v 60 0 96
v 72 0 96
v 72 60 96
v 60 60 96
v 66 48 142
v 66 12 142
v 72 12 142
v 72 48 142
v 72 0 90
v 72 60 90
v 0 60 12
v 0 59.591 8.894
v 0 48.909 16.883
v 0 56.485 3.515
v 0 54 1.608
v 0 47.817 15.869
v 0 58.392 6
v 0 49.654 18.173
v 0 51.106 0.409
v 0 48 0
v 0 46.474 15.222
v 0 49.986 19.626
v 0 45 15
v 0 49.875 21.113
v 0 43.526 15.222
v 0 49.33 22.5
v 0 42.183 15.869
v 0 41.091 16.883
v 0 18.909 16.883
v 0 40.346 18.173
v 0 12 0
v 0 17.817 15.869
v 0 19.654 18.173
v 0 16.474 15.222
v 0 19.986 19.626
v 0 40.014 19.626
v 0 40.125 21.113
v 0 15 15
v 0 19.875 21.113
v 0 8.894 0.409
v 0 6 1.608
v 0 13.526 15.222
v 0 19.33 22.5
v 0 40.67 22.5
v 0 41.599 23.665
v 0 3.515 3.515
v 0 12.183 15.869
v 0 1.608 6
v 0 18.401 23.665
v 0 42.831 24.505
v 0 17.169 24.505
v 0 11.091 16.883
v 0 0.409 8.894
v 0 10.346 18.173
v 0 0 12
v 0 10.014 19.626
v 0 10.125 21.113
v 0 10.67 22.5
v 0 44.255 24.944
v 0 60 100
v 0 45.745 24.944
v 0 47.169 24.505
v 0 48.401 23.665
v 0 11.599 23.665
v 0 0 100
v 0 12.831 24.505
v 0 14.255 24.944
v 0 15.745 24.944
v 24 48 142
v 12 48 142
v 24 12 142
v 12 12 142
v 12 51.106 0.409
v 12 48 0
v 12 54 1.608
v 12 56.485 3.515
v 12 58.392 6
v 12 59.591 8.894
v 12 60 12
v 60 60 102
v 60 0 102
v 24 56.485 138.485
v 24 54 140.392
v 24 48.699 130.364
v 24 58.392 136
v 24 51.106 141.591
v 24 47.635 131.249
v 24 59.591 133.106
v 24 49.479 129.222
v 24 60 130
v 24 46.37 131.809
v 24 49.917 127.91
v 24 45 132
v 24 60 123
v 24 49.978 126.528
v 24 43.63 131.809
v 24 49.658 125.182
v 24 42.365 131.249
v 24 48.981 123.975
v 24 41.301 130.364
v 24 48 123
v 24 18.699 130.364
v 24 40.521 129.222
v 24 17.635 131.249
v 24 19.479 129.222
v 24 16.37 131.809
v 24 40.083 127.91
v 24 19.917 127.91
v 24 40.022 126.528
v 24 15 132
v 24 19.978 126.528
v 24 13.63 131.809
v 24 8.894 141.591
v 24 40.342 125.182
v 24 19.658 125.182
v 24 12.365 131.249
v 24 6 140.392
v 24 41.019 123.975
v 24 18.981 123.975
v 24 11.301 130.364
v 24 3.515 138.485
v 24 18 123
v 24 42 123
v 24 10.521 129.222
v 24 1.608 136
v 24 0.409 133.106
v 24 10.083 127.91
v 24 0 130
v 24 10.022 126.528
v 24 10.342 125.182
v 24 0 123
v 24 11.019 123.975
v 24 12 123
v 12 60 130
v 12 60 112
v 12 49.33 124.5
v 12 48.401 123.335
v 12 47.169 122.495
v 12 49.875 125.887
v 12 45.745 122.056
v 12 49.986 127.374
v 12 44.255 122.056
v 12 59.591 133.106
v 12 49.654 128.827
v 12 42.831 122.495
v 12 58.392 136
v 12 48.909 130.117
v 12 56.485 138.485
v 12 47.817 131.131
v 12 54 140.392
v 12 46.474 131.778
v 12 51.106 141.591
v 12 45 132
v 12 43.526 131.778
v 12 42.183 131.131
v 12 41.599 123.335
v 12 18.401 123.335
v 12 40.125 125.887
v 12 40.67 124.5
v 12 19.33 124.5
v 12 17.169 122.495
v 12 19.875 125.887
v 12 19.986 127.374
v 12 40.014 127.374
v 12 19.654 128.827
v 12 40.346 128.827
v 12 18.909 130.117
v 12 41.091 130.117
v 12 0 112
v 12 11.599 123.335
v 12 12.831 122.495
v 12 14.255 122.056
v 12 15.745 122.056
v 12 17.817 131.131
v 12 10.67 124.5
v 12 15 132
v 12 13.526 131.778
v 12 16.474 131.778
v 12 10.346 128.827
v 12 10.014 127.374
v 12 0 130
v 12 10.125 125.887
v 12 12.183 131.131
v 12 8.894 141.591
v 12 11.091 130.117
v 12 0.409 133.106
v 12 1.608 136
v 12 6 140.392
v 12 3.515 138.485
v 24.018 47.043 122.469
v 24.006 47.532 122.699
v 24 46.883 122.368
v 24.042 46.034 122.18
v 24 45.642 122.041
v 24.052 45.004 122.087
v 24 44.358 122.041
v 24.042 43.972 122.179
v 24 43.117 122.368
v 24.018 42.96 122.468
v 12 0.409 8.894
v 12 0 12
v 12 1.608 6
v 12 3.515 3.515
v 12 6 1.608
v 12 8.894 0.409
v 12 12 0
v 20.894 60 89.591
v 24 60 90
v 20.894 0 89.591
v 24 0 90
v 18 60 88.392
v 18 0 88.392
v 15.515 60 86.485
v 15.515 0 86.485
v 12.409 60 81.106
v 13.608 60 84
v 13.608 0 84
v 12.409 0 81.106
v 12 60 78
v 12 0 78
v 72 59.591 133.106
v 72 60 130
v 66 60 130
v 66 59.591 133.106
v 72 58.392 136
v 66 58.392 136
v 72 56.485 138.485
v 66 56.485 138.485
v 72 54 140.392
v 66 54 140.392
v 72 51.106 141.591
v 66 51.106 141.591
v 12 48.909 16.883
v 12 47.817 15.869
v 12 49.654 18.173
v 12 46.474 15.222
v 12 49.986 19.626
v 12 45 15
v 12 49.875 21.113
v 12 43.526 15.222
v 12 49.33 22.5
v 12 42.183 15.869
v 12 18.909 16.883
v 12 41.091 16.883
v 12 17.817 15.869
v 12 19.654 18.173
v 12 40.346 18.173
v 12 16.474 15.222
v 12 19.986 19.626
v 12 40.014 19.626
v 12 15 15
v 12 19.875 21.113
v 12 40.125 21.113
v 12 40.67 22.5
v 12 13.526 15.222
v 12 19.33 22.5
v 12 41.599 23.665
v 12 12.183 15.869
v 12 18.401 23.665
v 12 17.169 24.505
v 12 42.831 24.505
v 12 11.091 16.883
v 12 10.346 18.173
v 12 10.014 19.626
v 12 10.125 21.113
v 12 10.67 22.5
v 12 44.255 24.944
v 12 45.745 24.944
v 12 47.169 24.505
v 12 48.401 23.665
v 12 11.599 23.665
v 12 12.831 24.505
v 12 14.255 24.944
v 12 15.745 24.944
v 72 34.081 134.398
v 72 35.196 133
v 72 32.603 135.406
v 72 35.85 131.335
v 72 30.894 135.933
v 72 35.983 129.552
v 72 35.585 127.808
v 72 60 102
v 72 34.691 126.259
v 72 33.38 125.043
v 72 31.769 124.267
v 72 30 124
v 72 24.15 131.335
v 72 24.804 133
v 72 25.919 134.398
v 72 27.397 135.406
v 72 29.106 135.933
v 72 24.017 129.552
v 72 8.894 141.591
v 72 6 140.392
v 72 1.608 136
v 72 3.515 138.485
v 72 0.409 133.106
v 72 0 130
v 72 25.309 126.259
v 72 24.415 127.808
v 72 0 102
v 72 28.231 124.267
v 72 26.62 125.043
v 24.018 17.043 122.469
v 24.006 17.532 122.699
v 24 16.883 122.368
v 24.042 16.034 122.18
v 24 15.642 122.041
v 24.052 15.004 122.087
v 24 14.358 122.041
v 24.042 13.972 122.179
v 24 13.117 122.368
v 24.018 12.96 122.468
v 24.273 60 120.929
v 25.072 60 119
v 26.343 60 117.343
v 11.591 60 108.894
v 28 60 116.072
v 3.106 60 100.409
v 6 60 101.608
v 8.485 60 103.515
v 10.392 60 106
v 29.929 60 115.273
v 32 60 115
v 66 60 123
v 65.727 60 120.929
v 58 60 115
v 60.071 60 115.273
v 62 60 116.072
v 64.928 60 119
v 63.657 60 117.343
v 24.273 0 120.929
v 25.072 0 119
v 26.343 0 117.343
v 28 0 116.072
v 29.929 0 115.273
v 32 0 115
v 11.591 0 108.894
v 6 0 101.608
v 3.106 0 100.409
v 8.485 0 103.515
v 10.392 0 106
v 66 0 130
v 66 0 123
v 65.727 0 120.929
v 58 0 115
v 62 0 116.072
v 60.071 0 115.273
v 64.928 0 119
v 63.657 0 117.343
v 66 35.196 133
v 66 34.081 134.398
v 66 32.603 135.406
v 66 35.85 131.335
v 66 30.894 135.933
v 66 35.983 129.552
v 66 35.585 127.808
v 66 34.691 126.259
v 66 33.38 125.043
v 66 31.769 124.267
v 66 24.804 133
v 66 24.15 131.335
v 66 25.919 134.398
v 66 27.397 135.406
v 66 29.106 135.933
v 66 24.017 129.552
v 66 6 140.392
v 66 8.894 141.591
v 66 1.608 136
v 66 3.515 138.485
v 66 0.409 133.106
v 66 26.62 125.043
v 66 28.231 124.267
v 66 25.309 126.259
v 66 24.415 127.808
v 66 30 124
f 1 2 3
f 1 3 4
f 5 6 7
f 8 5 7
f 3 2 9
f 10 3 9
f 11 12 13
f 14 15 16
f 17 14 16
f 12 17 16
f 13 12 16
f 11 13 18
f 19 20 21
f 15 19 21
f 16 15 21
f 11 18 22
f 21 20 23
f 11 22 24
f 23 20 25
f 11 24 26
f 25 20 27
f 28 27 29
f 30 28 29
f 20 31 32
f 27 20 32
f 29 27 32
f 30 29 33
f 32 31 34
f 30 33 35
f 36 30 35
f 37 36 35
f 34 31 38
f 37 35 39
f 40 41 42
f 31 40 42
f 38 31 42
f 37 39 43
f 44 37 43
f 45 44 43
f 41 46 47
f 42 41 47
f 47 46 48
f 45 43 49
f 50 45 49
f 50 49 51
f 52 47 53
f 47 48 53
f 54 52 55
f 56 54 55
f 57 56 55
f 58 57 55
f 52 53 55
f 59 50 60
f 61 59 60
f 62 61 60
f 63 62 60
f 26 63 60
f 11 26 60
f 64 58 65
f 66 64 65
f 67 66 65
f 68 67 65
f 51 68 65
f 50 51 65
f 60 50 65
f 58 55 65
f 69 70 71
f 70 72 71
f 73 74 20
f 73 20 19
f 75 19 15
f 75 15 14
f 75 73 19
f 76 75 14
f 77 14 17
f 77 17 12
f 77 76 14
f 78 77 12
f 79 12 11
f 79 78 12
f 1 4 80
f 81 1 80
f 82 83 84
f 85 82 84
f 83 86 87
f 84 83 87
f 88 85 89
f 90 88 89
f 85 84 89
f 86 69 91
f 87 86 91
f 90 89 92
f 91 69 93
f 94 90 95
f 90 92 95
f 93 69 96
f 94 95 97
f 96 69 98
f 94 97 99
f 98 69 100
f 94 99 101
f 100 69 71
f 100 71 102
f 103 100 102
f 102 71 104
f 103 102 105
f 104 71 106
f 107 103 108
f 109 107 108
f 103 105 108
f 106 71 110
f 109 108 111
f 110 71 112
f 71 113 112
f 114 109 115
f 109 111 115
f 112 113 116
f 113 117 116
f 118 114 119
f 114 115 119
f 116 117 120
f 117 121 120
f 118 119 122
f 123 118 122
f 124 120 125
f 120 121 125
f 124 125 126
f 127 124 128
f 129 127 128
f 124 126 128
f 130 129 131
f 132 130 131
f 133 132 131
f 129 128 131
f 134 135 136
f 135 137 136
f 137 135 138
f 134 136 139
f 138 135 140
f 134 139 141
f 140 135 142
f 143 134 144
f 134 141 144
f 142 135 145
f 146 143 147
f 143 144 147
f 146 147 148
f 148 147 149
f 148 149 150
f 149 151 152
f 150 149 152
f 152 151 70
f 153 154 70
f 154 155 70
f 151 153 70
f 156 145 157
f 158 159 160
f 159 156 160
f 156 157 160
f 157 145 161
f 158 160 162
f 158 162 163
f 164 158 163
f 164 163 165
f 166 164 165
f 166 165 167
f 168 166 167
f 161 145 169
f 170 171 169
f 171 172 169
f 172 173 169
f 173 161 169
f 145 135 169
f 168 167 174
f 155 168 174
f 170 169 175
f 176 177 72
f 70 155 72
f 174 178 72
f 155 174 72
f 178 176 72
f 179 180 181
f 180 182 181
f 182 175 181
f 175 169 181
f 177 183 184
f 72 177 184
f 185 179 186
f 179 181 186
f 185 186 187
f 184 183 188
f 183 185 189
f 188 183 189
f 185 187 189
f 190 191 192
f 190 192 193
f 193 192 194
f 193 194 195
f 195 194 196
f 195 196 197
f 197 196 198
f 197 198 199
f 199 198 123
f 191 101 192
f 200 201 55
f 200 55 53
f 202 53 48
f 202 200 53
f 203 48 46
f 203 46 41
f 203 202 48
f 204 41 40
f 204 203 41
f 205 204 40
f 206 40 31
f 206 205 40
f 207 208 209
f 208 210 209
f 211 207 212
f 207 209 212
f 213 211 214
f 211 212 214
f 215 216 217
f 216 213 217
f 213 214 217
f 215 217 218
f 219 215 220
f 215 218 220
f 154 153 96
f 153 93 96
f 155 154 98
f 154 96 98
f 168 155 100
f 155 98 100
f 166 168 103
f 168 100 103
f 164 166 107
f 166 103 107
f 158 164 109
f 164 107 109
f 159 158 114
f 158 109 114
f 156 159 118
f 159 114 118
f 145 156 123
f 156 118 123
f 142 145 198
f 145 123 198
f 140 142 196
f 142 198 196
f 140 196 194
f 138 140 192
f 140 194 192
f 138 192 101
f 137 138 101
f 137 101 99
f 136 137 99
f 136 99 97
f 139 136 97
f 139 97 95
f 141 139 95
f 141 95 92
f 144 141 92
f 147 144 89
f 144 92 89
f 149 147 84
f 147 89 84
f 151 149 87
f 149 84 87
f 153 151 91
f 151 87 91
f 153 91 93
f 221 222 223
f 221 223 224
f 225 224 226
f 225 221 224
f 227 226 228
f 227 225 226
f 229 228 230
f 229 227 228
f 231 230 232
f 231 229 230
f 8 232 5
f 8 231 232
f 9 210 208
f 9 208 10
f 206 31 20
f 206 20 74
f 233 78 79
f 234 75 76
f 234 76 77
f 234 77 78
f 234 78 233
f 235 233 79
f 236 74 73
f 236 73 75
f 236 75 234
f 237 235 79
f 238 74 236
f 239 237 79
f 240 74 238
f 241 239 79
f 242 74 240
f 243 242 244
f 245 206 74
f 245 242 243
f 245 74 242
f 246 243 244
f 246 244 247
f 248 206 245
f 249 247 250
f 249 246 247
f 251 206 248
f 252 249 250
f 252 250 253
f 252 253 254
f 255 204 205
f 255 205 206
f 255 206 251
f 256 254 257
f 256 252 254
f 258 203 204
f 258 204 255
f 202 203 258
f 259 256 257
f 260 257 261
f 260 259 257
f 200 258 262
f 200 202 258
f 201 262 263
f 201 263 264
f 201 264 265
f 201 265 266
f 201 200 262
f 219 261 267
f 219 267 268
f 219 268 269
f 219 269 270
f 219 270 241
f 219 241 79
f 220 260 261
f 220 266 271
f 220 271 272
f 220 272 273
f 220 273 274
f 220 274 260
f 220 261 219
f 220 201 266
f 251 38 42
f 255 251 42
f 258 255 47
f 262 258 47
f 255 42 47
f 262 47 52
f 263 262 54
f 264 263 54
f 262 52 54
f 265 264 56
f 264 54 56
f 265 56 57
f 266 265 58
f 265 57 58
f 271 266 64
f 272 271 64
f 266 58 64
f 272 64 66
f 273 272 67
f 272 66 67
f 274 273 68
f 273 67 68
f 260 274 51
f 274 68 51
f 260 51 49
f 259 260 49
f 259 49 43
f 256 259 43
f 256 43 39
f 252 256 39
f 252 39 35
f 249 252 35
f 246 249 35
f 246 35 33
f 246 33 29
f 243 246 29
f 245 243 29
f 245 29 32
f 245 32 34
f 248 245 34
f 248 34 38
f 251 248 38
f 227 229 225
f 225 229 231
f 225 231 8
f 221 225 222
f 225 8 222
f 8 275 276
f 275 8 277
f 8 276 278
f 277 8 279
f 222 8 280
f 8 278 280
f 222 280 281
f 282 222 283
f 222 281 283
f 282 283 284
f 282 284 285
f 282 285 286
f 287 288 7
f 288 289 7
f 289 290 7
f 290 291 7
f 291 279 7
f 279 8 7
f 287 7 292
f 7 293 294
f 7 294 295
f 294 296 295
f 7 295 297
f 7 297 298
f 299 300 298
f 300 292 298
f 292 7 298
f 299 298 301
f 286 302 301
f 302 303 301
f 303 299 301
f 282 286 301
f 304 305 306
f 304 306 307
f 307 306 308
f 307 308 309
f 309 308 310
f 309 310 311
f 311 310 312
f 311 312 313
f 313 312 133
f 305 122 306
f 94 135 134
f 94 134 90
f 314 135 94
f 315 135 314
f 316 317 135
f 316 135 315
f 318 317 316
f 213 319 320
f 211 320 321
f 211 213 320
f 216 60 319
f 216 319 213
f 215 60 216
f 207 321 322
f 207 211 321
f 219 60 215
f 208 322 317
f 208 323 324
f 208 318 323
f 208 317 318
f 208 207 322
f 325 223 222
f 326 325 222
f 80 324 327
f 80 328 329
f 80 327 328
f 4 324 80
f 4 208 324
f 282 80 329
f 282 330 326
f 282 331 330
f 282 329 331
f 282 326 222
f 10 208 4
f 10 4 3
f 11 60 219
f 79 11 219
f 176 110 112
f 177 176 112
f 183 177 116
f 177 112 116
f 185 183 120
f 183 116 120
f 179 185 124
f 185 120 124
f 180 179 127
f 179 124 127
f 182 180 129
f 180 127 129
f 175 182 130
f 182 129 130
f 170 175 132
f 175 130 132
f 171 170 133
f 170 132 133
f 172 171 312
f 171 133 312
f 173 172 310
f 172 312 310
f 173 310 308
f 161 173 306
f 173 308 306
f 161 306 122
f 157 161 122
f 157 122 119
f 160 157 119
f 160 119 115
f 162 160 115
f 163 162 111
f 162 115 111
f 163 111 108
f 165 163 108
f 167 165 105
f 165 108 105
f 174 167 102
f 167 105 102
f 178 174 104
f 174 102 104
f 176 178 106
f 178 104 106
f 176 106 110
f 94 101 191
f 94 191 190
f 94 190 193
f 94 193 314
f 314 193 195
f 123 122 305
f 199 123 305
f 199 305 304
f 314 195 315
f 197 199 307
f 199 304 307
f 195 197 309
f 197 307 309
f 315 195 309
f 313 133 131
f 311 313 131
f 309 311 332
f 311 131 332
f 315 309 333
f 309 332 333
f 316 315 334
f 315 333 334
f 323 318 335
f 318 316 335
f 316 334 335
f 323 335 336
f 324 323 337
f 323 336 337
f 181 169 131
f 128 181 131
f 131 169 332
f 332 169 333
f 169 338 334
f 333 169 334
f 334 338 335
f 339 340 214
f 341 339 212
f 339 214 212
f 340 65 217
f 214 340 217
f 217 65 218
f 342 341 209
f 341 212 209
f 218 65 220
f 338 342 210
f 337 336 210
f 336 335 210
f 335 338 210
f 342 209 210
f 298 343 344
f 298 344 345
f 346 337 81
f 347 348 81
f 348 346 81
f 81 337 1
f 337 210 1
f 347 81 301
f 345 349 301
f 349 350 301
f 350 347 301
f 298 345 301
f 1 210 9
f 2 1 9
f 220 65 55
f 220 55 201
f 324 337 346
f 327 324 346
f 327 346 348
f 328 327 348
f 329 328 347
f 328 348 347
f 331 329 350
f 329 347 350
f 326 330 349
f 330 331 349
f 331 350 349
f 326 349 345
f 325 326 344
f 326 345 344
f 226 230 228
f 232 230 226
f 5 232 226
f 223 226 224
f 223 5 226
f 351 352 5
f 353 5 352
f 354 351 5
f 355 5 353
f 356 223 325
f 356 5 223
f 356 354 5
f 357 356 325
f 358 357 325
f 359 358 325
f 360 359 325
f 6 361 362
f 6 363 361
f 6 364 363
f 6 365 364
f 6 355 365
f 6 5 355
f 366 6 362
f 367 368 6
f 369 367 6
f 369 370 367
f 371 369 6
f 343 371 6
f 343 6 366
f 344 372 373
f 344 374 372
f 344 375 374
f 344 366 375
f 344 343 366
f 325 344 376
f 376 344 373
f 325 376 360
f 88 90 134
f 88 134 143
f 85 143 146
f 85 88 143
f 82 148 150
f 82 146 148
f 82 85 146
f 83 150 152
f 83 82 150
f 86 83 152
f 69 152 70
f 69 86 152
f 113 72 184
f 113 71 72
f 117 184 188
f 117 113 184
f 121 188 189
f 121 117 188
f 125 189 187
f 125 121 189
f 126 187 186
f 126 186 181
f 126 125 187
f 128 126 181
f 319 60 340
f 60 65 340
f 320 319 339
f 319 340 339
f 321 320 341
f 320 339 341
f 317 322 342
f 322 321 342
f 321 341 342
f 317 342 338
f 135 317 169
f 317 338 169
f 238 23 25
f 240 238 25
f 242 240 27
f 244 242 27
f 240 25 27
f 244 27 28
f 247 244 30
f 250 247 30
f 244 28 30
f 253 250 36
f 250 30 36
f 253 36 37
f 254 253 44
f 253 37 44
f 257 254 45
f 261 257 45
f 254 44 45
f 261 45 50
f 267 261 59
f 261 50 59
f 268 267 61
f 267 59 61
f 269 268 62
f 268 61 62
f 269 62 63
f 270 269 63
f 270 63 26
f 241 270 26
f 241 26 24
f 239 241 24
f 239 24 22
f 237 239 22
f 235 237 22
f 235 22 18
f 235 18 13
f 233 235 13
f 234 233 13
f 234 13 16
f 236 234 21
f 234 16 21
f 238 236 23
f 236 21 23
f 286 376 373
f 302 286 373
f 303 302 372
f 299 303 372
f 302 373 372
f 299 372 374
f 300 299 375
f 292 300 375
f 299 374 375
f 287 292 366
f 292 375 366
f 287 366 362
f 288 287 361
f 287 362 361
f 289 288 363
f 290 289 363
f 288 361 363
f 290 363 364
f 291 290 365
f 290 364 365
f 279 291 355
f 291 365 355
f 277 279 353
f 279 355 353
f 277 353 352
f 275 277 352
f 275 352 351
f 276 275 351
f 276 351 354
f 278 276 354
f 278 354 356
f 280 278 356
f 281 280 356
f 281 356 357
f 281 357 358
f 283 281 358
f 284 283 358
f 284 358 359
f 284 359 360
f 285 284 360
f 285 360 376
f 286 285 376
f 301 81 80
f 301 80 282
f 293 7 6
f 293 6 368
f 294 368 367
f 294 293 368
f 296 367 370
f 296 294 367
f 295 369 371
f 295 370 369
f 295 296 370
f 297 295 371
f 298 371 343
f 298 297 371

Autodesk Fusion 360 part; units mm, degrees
sketch "Sketch1" plane through (0, 0, 0) normal (0, 1, 0) x (1, 0, 0)
  line L0 (0, 0) -> (0, -100)
  line L1 (12, -112) -> (12, -142)
  arc A0 (12, -112) -> (0, -100) centre (0, -112) ccw
  line L2 (12, -142) -> (24, -142)
  line L3 (0, 0) -> (12, 0)
  line L4 (12, 0) -> (12, -78)
  line L5 (24, -90) -> (72, -90)
  line L6 (32, -115) -> (58, -115)
  line L7 (24, -142) -> (24, -123)
  arc A1 (32, -115) -> (24, -123) centre (32, -123) ccw
  line L8 (66, -142) -> (66, -123)
  arc A2 (66, -123) -> (58, -115) centre (58, -123) ccw
  line L9 (66, -142) -> (72, -142)
  line L10 (72, -142) -> (72, -90)
  arc A3 (12, -78) -> (24, -90) centre (24, -78) ccw
  point P0 (12, -90)
  dimension "d1" = 100
  dimension "d2" = 24
  dimension "d4" = 142
  dimension "d6" = 12
  dimension "d7" = 90
  dimension "d8" = 25
  dimension "d9" = 8
  dimension "d10" = 42
  dimension "d11" = 8
  dimension "d12" = 6
  dimension "d13" = 12
extrude "Extrude1" add sketch "Sketch1" along normal blind 60
fillet "Fillet1" radius 12 2 edges at (18, 60, 142) (18, 0, 142)
fillet "Fillet2" radius 12 2 edges at (69, 0, 142) (69, 60, 142)
fillet "Fillet3" radius 12 2 edges at (6, 60, 0) (6, 0, 0)
sketch "Sketch2" plane through (0, 0, 0) normal (0, -1, 0) x (1, 0, 0)
  line L0 (0, 12) -> (12, 12)
  line L1 (12, 12) -> (12, 78)
  arc A0 (24, 90) -> (12, 78) centre (24, 78) ccw
  line L2 (24, 90) -> (72, 90)
  line L3 (72, 90) -> (72, 130)
  line L4 (72, 130) -> (66, 130)
  line L5 (66, 130) -> (66, 123)
  arc A1 (58, 115) -> (66, 123) centre (58, 123) ccw
  line L6 (58, 115) -> (32, 115)
  arc A2 (24, 123) -> (32, 115) centre (32, 123) ccw
  line L7 (24, 123) -> (24, 130)
  line L8 (24, 130) -> (12, 130)
  line L9 (12, 130) -> (12, 112)
  arc A3 (0, 100) -> (12, 112) centre (0, 112) ccw
  line L10 (0, 100) -> (0, 12)
  line L11 (60, 102) -> (72, 102)
  line L12 (72, 102) -> (72, 96)
  line L13 (72, 96) -> (60, 96)
  line L14 (60, 96) -> (60, 102)
  dimension "d22" = 6
  dimension "d23" = 12
  dimension "d24" = 12
extrude "Extrude2" cut sketch "Sketch2" against normal through all contours L3 L11 L12 L13 L14
sketch "Sketch3" plane through (72, 0, 0) normal (1, 0, 0) x (0, 1, 0)
  line L0 (0, 102) -> (60, 102)
  line L1 (60, 102) -> (60, 130)
  arc A0 (60, 130) -> (48, 142) centre (48, 130) ccw
  line L2 (48, 142) -> (12, 142)
  arc A1 (12, 142) -> (0, 130) centre (12, 130) ccw
  line L3 (0, 130) -> (0, 102)
  point P0 (30, 130)
hole "Hole1" at (72, 30, 130) direction (-1, 0, 0) diameter 12 depth 6 tip angle 118
sketch "Sketch4" plane through (12, 0, 0) normal (1, 0, 0) x (0, 1, 0)
  arc A0 (0, 12) -> (12, 0) centre (12, 12) ccw
  line L0 (12, 0) -> (48, 0)
  arc A1 (48, 0) -> (60, 12) centre (48, 12) ccw
  line L1 (60, 12) -> (60, 78)
  line L2 (60, 78) -> (0, 78)
  line L3 (0, 78) -> (0, 12)
  point P0 (15, 20)
  point P1 (45, 20)
  dimension "d30" = 15
  dimension "d31" = 15
  dimension "d32" = 20
hole "Hole2" at (12, 45, 20) at (12, 15, 20) direction (-1, 0, 0) diameter 10 depth 12 tip angle 118
sketch "Sketch5" plane through (12, 0, 0) normal (-1, 0, 0) x (0, -1, 0)
  arc A0 (0, 130) -> (-12, 142) centre (-12, 130) ccw
  line L0 (-12, 142) -> (-48, 142)
  arc A1 (-48, 142) -> (-60, 130) centre (-48, 130) ccw
  line L1 (-60, 130) -> (-60, 112)
  line L2 (-60, 112) -> (0, 112)
  line L3 (0, 112) -> (0, 130)
  point P0 (-45, 127)
  point P1 (-15, 127)
  dimension "d36" = 30
  dimension "d37" = 15
  dimension "d38" = 15
hole "Hole3" at (12, 45, 127) at (12, 15, 127) direction (1, 0, 0) diameter 10 depth 12 tip angle 118
